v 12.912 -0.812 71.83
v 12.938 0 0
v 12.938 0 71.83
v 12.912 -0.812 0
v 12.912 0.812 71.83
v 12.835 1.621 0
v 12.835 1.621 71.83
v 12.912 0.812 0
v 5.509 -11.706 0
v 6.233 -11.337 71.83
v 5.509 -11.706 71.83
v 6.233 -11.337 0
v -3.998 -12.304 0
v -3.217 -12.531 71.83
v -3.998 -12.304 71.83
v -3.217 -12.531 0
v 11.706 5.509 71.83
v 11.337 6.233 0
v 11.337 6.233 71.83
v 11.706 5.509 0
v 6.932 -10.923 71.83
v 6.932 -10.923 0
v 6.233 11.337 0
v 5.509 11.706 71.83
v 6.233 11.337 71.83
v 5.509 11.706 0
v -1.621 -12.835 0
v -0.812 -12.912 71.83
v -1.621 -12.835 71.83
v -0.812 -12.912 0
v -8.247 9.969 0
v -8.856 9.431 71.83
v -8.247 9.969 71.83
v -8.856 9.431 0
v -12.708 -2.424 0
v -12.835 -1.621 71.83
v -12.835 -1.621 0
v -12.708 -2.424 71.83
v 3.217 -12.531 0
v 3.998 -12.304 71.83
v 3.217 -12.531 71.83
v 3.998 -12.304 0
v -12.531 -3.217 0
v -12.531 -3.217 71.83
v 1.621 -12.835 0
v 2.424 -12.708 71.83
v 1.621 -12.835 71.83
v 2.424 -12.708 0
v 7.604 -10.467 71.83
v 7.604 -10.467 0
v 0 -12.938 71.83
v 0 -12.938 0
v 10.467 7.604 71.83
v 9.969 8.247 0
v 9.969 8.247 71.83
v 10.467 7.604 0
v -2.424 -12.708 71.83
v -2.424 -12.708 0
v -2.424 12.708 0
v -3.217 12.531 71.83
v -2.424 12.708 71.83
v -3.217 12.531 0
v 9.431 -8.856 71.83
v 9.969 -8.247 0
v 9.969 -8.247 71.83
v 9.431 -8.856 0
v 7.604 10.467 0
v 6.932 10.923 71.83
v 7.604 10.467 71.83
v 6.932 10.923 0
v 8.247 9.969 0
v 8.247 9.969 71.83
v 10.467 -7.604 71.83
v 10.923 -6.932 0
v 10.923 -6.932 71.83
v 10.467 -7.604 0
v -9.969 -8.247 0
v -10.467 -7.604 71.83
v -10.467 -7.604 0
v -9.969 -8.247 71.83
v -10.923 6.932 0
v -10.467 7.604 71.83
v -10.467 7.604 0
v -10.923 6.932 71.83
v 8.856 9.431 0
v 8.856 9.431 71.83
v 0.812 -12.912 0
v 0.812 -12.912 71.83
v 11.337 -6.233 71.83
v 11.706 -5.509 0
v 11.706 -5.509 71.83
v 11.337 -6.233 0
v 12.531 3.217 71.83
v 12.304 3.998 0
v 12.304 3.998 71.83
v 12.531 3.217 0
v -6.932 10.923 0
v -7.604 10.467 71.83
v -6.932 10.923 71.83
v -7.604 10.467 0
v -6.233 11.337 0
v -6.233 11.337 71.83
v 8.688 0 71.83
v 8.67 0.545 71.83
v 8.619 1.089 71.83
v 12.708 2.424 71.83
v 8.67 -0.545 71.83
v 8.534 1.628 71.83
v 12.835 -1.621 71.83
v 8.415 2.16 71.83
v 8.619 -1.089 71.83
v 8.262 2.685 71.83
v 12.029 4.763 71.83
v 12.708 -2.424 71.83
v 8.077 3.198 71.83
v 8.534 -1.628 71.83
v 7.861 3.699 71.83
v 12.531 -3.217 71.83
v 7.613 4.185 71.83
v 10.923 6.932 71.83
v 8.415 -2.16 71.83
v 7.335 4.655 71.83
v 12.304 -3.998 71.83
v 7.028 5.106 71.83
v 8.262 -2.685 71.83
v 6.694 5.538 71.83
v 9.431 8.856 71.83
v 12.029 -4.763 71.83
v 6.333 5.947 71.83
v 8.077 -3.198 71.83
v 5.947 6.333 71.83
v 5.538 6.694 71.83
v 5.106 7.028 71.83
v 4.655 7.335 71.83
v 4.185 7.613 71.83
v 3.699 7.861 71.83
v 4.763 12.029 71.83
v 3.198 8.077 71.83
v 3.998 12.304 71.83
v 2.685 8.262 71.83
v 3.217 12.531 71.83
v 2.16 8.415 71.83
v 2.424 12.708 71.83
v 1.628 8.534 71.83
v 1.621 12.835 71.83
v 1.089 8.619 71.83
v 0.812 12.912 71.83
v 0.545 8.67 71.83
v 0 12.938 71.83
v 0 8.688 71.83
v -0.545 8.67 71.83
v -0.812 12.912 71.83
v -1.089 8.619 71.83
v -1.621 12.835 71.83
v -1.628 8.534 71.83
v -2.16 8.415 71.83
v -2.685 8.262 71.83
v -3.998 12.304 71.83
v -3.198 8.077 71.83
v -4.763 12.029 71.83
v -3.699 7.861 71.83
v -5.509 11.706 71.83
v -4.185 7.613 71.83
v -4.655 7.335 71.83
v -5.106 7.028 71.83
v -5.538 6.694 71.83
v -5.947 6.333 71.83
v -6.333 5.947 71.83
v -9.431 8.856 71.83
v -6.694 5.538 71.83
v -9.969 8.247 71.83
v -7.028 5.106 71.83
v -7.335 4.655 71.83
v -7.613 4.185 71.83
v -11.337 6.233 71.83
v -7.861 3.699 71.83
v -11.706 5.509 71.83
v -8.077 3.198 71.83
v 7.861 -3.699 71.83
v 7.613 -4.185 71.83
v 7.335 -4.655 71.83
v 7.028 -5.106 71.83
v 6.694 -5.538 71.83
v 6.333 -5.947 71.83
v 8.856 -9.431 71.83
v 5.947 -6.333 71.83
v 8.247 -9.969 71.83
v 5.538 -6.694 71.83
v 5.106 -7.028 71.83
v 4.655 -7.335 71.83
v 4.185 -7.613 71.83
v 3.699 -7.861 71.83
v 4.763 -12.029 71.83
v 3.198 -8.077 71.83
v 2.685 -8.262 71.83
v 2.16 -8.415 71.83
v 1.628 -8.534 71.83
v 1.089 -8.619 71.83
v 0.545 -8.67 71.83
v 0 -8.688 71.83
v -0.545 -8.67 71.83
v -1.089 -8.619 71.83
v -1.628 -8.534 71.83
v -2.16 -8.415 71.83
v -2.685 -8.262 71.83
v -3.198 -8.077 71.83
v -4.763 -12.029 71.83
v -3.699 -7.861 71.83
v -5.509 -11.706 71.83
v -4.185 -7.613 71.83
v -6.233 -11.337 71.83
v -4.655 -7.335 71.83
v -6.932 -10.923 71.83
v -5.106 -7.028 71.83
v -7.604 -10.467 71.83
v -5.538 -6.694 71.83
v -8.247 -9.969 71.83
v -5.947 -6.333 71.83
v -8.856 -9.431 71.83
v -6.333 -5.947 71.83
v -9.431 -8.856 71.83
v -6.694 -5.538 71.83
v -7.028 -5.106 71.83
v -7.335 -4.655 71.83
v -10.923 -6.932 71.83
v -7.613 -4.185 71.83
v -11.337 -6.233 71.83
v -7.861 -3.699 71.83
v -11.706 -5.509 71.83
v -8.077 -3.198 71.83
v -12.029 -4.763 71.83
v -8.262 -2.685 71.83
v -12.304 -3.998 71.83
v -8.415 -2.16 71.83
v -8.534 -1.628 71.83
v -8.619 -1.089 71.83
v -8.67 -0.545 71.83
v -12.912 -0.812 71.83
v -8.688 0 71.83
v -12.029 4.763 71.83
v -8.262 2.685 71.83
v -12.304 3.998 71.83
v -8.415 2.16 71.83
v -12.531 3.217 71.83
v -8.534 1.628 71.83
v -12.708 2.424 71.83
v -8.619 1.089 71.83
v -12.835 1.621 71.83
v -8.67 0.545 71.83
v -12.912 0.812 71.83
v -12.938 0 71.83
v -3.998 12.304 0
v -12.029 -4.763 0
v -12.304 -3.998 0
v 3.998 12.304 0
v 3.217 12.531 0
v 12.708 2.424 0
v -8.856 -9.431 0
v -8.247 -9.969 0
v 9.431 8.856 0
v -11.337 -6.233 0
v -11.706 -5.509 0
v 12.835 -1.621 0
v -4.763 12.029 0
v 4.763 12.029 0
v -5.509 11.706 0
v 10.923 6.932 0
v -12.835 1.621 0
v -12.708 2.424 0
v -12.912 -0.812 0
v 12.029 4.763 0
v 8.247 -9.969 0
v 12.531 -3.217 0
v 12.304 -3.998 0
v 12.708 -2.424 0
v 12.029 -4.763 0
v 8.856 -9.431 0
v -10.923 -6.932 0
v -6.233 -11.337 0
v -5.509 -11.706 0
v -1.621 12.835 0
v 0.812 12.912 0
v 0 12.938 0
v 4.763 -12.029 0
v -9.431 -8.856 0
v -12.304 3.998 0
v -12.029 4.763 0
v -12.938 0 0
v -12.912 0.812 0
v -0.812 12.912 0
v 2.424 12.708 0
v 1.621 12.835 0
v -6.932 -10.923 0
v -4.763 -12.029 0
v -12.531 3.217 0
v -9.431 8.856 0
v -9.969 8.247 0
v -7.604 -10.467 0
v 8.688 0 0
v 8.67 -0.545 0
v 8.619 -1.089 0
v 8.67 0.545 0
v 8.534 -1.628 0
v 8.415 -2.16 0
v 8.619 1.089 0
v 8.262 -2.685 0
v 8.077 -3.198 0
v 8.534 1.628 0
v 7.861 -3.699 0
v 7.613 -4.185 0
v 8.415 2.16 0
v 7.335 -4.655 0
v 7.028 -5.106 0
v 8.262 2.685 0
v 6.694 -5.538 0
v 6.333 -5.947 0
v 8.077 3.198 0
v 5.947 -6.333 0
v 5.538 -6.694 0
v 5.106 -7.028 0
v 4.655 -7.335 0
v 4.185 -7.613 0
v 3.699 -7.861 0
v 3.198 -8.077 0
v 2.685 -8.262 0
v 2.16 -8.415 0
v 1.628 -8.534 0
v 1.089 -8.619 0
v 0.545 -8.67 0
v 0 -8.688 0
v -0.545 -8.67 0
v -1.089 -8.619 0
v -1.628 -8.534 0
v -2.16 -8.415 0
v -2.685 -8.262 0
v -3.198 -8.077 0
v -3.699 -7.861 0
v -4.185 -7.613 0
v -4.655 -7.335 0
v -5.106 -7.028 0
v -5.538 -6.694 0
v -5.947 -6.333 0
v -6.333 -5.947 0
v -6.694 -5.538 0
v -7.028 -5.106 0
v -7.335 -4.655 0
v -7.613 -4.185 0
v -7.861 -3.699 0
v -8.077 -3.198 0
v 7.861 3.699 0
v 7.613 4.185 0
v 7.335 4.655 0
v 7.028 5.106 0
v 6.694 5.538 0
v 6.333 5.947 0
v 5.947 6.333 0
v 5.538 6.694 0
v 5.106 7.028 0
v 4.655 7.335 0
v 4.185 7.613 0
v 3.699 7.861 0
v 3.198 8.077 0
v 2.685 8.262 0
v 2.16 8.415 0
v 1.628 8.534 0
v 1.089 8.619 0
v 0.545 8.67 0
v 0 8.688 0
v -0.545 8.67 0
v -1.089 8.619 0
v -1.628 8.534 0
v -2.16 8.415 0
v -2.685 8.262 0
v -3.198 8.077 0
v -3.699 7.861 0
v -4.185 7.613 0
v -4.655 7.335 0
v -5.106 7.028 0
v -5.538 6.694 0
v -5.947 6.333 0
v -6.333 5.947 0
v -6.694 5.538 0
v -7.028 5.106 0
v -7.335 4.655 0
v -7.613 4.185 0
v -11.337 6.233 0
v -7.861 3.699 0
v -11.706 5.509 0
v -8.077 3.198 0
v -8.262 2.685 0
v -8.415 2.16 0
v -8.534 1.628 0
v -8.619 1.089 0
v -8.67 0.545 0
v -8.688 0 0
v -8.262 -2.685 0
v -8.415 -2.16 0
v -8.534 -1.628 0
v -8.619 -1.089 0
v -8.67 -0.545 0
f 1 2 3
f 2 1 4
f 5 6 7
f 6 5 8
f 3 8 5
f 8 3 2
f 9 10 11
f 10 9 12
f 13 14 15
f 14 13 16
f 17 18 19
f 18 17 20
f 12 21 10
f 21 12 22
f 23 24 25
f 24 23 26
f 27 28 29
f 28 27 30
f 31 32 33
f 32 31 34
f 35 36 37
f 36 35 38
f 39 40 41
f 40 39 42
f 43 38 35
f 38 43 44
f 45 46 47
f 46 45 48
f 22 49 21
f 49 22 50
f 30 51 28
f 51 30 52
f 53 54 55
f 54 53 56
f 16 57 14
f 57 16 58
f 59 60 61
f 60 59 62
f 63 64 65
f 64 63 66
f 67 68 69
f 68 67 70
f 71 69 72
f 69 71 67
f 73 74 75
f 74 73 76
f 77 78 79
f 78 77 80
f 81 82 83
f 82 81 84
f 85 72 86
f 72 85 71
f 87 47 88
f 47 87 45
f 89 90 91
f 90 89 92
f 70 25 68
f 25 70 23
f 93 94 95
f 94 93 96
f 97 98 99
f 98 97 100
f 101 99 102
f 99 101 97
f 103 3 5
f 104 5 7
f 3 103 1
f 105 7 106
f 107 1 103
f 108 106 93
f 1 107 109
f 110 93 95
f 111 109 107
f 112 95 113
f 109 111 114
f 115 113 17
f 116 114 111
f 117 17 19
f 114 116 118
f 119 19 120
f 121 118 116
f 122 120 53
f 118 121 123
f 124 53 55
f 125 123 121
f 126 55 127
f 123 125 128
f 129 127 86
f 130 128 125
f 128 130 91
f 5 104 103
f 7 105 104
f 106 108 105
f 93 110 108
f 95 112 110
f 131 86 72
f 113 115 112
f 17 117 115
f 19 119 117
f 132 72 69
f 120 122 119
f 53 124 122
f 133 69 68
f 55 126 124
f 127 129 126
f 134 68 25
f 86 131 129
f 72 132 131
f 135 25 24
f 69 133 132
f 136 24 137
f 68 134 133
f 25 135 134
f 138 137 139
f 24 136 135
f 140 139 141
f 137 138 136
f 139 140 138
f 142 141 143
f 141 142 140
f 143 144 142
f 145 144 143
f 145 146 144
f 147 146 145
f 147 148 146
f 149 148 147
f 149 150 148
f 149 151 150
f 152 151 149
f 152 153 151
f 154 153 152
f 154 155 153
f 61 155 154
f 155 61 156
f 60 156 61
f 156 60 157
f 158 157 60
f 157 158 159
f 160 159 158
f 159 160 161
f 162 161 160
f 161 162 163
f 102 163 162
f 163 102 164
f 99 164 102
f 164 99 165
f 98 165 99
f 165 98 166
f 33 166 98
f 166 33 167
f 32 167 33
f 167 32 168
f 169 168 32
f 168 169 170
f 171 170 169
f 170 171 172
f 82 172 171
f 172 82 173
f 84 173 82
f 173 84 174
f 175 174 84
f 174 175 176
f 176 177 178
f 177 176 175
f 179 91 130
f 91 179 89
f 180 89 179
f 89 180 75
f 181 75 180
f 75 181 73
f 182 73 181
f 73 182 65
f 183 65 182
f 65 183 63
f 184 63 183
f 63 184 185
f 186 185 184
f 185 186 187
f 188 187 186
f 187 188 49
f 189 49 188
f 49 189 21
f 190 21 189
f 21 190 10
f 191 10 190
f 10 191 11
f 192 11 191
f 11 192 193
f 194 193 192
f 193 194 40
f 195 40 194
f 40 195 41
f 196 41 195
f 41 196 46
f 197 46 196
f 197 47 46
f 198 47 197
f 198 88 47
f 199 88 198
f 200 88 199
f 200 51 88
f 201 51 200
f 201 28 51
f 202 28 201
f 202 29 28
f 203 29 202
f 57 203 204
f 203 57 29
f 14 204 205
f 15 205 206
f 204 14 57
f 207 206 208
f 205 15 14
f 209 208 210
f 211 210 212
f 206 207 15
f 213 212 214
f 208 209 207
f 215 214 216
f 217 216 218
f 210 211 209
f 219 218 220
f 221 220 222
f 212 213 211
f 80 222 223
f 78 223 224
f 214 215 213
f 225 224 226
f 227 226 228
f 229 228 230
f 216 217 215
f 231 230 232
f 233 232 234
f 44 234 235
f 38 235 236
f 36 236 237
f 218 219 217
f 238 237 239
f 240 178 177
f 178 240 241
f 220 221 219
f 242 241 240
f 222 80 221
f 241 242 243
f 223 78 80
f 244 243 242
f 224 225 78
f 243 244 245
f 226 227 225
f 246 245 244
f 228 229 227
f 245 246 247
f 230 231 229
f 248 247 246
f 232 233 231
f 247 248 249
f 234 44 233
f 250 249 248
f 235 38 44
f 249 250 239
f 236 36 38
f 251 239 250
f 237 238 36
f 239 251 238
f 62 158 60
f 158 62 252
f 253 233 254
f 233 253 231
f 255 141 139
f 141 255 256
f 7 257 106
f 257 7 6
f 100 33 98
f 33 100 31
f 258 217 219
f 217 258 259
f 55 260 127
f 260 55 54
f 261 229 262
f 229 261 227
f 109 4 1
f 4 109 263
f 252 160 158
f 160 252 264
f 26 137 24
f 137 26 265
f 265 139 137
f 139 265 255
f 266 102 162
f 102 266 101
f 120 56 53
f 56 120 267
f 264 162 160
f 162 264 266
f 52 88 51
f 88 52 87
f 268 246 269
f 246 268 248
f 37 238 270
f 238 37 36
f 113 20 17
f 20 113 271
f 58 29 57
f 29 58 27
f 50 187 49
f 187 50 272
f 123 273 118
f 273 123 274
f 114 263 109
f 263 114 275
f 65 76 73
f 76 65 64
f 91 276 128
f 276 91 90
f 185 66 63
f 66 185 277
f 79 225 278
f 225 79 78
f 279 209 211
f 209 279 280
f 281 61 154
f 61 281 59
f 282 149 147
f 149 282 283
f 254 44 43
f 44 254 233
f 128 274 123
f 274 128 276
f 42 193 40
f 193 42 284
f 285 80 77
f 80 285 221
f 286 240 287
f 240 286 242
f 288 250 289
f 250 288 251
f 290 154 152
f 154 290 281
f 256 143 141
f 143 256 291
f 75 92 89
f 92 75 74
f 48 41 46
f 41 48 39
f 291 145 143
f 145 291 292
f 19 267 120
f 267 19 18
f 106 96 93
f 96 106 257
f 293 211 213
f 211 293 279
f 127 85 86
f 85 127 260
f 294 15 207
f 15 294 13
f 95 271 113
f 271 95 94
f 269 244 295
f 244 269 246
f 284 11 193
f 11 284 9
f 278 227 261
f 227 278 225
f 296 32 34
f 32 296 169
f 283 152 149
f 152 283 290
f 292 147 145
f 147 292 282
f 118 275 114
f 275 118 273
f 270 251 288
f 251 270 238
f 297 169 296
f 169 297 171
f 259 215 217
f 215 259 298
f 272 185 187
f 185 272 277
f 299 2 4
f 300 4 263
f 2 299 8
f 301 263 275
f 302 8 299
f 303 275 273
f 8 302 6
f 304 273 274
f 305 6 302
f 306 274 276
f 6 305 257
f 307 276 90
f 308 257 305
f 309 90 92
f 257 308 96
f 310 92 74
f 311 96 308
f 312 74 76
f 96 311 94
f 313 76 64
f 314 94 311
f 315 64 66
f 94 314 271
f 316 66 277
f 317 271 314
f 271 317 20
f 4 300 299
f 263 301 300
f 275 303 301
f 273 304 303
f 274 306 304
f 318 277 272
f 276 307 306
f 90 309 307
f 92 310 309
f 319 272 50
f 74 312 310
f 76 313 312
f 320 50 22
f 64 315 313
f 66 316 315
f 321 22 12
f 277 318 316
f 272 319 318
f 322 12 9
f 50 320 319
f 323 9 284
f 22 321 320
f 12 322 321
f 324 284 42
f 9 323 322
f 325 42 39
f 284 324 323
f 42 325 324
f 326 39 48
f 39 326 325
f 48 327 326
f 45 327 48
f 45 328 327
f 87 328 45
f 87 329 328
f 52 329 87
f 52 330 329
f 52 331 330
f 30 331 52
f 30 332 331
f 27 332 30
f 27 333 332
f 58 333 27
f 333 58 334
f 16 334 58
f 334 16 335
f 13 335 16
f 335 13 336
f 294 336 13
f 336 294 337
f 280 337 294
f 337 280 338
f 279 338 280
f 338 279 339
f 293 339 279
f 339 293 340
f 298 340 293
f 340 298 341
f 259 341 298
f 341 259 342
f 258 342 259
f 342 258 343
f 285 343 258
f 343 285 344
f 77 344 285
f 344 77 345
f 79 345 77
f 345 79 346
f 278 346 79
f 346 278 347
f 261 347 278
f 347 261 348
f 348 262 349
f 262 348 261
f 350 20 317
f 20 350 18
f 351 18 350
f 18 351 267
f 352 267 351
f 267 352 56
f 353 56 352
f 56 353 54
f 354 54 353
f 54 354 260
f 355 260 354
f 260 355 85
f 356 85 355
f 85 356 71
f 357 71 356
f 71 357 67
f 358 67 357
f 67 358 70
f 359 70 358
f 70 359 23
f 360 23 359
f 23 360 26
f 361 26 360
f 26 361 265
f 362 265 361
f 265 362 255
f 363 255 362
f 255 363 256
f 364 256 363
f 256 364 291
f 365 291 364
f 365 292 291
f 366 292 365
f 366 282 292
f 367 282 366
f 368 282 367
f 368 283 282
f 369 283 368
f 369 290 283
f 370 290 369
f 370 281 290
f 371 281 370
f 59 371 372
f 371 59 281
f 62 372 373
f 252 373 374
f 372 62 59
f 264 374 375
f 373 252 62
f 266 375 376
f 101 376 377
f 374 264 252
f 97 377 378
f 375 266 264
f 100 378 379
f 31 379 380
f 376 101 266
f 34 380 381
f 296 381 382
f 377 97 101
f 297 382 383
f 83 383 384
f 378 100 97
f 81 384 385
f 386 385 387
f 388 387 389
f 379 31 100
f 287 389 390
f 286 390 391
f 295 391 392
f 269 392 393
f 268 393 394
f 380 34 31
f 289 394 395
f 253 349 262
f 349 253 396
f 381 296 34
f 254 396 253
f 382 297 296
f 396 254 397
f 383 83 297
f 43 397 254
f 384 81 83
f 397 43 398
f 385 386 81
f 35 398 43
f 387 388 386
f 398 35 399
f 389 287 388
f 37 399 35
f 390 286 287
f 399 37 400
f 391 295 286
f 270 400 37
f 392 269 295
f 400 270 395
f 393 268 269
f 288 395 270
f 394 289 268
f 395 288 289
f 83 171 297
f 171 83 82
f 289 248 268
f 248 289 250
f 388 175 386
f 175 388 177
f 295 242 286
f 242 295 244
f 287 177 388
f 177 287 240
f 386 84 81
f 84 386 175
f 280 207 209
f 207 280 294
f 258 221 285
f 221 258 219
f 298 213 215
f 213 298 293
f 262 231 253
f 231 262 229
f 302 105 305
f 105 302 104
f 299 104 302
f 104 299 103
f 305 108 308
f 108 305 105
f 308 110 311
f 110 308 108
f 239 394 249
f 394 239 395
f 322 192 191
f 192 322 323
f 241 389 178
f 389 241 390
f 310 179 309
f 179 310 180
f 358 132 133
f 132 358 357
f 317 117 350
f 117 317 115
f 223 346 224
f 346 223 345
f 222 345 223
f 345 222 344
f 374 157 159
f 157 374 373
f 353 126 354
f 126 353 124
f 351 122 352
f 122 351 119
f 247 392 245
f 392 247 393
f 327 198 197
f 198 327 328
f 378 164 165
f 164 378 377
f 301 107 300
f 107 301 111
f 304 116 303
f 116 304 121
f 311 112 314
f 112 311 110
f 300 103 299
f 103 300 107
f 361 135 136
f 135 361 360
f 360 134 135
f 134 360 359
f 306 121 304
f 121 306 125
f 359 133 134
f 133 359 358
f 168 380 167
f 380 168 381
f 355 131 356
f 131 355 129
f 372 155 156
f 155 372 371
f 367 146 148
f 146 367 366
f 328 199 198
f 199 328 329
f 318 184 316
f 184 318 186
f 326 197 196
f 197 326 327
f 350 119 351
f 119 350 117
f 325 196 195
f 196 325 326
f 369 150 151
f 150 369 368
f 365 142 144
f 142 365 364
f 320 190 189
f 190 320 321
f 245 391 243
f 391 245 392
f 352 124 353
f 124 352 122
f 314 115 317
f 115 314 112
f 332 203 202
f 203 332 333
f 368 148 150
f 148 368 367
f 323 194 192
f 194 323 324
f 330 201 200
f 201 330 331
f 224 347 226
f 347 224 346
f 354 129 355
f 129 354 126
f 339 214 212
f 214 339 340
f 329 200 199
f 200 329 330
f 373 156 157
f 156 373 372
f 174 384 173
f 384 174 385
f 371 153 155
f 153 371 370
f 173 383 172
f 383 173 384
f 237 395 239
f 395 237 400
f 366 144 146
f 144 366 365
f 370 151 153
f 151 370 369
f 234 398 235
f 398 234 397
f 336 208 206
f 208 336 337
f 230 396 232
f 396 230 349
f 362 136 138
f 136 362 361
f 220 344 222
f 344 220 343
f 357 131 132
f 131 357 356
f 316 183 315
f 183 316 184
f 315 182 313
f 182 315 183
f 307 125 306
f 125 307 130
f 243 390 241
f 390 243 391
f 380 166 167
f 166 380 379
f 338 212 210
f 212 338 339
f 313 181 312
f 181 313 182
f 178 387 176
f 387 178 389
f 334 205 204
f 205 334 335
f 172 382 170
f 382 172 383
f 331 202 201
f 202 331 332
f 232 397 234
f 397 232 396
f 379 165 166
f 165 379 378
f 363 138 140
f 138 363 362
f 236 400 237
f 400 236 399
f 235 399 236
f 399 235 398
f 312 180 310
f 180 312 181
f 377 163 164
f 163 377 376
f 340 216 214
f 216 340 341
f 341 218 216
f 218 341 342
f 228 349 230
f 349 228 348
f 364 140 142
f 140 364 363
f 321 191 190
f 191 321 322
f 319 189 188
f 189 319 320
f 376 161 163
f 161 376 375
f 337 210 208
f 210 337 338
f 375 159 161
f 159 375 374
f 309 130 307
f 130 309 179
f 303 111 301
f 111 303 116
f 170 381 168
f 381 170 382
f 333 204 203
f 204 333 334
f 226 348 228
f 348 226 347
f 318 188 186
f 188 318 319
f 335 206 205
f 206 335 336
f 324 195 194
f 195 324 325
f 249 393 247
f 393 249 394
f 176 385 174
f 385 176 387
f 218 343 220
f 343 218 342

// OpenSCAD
difference()
{

    cylinder(d=15.875 + 10, h=79 - 7.17, $fn=100);
    
    translate([0,0,-.01])
    cylinder(d=15.875 + 1.5, h=79 - 7.17 + .02, $fn=100);
   
    
}
